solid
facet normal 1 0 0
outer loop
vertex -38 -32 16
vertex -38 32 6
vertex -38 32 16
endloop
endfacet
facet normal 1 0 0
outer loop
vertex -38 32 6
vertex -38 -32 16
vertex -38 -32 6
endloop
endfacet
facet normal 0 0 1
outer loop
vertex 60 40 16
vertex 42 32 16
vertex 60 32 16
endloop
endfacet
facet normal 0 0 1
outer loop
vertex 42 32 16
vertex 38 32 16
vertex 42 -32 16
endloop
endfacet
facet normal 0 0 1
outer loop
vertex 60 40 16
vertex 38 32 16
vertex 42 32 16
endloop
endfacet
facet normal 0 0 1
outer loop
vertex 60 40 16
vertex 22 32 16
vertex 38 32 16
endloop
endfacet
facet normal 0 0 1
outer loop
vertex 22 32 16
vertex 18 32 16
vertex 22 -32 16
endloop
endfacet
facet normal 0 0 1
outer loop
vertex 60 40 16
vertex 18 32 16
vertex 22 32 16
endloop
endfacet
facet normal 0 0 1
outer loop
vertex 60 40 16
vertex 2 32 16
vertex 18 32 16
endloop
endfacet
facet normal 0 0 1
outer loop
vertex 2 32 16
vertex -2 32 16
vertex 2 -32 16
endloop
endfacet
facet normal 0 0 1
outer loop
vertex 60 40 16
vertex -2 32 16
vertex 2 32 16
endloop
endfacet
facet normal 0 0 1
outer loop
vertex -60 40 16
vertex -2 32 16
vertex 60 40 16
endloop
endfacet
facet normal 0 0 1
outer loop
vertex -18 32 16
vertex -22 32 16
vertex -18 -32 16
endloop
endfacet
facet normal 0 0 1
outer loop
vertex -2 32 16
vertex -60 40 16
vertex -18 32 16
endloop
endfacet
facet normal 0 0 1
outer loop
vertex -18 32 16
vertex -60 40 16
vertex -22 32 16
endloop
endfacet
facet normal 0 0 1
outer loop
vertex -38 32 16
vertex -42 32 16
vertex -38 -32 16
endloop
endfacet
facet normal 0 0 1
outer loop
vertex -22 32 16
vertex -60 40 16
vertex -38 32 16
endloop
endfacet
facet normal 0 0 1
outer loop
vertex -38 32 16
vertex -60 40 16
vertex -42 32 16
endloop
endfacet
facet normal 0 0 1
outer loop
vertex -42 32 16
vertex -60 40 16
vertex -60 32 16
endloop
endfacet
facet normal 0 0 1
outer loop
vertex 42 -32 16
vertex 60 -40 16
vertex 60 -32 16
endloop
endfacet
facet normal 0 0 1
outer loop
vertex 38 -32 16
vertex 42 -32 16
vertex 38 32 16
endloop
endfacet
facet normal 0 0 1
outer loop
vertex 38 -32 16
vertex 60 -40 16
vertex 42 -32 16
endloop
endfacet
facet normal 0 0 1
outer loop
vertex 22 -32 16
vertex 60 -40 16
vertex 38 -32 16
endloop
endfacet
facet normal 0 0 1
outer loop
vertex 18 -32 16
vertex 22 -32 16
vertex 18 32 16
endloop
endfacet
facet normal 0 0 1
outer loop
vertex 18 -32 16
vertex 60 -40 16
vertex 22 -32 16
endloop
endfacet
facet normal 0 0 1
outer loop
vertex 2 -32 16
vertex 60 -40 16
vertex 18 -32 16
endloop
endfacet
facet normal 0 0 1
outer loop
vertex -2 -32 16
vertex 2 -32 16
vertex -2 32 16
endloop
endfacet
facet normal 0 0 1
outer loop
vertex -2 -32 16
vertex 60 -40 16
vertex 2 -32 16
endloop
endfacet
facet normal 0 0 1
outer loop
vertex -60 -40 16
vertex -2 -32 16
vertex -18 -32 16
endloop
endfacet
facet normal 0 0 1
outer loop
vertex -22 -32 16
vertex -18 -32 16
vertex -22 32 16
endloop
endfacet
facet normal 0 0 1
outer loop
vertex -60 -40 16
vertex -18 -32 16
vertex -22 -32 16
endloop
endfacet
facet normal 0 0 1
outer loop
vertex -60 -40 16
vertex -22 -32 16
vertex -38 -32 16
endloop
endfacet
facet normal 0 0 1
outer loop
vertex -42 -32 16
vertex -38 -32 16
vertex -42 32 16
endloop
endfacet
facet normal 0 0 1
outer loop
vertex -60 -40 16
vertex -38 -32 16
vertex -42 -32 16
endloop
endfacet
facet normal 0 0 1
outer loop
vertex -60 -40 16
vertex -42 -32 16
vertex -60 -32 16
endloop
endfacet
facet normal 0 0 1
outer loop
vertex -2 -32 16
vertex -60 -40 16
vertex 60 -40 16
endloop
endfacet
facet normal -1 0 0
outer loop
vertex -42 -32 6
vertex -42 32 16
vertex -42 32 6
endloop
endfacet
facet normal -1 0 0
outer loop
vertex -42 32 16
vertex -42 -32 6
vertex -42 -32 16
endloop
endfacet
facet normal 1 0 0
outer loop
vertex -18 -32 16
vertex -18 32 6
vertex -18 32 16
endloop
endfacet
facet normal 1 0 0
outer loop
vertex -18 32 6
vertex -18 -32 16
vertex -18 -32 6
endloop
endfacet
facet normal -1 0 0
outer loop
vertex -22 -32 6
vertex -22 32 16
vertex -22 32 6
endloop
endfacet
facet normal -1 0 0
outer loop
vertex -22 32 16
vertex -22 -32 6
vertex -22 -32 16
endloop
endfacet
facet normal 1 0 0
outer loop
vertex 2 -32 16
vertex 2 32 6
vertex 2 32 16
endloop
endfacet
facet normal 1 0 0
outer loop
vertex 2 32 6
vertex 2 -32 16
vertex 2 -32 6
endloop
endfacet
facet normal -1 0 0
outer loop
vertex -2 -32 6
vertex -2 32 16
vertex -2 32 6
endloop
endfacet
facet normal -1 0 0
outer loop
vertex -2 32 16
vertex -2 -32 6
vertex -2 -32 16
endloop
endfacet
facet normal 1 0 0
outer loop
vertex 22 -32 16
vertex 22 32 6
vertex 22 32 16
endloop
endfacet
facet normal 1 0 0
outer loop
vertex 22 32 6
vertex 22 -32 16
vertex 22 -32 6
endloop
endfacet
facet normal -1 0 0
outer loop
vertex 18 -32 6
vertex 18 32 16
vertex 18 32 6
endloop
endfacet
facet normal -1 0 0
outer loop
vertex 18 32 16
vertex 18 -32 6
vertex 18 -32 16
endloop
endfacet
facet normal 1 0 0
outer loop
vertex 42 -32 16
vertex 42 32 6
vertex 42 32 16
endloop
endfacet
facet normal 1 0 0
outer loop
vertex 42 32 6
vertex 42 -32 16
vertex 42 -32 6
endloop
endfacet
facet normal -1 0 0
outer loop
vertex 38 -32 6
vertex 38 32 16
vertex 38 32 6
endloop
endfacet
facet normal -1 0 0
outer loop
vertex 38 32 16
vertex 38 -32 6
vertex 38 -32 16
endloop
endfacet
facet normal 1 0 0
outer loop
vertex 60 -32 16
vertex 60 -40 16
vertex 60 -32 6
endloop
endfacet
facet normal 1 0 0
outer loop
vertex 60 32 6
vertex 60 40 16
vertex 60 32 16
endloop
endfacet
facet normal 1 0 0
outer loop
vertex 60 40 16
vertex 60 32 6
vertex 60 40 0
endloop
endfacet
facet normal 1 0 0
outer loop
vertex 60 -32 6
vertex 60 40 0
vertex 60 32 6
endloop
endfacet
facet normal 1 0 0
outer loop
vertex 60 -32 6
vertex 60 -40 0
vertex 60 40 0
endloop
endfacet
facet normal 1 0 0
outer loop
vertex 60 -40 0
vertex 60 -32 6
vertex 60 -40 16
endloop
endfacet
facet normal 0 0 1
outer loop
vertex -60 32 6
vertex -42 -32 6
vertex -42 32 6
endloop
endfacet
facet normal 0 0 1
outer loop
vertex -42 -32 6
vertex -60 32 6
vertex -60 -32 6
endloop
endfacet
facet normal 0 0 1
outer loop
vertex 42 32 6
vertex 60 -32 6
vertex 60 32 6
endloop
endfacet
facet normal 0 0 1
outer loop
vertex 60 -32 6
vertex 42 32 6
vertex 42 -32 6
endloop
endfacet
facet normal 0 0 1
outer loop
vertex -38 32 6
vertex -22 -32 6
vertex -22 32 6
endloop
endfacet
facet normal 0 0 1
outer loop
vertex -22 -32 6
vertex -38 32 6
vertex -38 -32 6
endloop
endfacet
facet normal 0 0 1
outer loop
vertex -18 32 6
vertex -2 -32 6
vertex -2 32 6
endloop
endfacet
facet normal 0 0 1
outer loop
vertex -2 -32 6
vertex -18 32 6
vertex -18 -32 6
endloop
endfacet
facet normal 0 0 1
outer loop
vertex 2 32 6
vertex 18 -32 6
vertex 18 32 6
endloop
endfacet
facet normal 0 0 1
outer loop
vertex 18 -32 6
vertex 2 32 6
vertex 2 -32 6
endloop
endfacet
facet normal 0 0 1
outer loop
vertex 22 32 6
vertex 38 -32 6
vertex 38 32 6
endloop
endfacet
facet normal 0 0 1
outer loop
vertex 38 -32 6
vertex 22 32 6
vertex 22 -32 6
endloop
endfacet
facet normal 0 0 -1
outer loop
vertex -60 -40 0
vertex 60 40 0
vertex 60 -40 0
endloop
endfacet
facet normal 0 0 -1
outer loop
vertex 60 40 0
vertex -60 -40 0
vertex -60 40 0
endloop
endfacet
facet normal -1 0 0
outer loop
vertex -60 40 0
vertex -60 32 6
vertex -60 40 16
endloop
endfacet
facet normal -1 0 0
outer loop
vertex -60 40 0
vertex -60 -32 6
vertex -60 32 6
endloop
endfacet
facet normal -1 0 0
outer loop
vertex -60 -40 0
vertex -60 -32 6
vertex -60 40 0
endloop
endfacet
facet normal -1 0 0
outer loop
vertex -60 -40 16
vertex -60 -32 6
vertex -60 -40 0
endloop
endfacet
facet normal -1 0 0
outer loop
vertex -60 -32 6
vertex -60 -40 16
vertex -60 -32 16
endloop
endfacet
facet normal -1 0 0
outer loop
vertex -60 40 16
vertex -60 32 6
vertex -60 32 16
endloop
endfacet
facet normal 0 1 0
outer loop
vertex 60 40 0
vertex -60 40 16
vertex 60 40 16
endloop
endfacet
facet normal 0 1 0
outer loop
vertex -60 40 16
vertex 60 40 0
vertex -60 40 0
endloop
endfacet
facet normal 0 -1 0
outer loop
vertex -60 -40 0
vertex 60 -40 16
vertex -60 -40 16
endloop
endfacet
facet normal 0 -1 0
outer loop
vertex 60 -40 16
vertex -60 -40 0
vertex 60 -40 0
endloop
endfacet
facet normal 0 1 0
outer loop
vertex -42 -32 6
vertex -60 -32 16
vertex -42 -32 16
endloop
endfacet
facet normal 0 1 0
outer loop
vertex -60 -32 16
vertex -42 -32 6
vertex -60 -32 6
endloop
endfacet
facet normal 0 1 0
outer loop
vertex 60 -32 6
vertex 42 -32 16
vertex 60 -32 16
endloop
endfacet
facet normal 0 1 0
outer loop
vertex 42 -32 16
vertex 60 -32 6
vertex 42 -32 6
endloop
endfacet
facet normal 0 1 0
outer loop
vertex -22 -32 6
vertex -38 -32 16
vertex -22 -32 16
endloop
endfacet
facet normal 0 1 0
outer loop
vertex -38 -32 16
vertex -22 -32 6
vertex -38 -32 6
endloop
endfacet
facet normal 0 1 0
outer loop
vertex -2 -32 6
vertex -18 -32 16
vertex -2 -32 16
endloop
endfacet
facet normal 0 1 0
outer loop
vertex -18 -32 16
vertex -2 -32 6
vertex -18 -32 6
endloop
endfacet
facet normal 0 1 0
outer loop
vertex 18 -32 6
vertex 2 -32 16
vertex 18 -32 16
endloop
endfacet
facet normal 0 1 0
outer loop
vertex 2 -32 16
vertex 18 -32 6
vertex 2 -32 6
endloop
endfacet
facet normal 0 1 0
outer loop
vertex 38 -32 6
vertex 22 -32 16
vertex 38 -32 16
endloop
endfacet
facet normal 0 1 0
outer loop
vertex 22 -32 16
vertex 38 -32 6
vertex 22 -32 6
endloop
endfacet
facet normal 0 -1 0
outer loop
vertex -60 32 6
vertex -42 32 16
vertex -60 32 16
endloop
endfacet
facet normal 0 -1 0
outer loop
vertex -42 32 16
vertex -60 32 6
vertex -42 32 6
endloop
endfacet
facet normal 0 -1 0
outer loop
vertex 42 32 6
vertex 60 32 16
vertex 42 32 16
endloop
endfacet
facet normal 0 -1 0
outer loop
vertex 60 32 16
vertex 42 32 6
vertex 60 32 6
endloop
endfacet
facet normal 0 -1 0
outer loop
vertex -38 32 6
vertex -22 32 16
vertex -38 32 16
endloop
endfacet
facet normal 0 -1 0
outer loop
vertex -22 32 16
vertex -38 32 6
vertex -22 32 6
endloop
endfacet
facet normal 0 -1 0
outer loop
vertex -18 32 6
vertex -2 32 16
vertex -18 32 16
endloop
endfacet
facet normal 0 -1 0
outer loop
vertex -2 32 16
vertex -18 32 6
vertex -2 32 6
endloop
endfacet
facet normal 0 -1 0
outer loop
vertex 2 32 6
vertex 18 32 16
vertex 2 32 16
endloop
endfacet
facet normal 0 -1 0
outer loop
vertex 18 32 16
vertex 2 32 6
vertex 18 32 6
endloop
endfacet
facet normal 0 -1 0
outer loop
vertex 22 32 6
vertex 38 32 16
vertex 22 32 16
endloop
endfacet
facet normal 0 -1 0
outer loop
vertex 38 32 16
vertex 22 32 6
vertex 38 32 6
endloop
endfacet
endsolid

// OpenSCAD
$fn = 32;

// ----------------------------------------------------------------------
// Rib frame 120 x 80 x 16
// 5 ribs at 20 mm pitch
// ----------------------------------------------------------------------

// --- parameters (mm) ---
frame = [120, 80, 6];  // base plate size (x, y, z)
seat_tol = 0.1;        // tolerance at the seating features
free_tol = 0.3;        // general tolerance on the free sizes
rail_w = 8;            // side rail width
ribs = 5;              // number of ribs
rib_t = 4;             // rib thickness
rib_h = 10;            // rib height above the base plate
pitch = 20;            // pitch between rib centres

// --- derived feature positions (mm) ---
span = (ribs - 1) * pitch;          // = 80   distance between the outer ribs
origin_x = -span / 2;               // = -40   X of the first rib
rib_len = frame[1] - 2 * rail_w + 2;  // = 66   rib length, 1 mm into each rail
feature_centers = [
  [origin_x + 0 * pitch, 0],
  [origin_x + 1 * pitch, 0],
  [origin_x + 2 * pitch, 0],
  [origin_x + 3 * pitch, 0],
  [origin_x + 4 * pitch, 0]
];   // rib centre line, drives the rib loop

// base plate, two side rails, then the ribs read straight off feature_centers
union() {
  translate([-frame[0] / 2, -frame[1] / 2, 0]) cube(frame);
  translate([-frame[0] / 2, -frame[1] / 2, 0]) cube([frame[0], rail_w, frame[2] + rib_h]);
  translate([-frame[0] / 2, frame[1] / 2 - rail_w, 0]) cube([frame[0], rail_w, frame[2] + rib_h]);
  for (centre = feature_centers)
    translate([centre[0] - rib_t / 2, centre[1] - rib_len / 2, frame[2] - 1])
      cube([rib_t, rib_len, rib_h + 1]);
}
